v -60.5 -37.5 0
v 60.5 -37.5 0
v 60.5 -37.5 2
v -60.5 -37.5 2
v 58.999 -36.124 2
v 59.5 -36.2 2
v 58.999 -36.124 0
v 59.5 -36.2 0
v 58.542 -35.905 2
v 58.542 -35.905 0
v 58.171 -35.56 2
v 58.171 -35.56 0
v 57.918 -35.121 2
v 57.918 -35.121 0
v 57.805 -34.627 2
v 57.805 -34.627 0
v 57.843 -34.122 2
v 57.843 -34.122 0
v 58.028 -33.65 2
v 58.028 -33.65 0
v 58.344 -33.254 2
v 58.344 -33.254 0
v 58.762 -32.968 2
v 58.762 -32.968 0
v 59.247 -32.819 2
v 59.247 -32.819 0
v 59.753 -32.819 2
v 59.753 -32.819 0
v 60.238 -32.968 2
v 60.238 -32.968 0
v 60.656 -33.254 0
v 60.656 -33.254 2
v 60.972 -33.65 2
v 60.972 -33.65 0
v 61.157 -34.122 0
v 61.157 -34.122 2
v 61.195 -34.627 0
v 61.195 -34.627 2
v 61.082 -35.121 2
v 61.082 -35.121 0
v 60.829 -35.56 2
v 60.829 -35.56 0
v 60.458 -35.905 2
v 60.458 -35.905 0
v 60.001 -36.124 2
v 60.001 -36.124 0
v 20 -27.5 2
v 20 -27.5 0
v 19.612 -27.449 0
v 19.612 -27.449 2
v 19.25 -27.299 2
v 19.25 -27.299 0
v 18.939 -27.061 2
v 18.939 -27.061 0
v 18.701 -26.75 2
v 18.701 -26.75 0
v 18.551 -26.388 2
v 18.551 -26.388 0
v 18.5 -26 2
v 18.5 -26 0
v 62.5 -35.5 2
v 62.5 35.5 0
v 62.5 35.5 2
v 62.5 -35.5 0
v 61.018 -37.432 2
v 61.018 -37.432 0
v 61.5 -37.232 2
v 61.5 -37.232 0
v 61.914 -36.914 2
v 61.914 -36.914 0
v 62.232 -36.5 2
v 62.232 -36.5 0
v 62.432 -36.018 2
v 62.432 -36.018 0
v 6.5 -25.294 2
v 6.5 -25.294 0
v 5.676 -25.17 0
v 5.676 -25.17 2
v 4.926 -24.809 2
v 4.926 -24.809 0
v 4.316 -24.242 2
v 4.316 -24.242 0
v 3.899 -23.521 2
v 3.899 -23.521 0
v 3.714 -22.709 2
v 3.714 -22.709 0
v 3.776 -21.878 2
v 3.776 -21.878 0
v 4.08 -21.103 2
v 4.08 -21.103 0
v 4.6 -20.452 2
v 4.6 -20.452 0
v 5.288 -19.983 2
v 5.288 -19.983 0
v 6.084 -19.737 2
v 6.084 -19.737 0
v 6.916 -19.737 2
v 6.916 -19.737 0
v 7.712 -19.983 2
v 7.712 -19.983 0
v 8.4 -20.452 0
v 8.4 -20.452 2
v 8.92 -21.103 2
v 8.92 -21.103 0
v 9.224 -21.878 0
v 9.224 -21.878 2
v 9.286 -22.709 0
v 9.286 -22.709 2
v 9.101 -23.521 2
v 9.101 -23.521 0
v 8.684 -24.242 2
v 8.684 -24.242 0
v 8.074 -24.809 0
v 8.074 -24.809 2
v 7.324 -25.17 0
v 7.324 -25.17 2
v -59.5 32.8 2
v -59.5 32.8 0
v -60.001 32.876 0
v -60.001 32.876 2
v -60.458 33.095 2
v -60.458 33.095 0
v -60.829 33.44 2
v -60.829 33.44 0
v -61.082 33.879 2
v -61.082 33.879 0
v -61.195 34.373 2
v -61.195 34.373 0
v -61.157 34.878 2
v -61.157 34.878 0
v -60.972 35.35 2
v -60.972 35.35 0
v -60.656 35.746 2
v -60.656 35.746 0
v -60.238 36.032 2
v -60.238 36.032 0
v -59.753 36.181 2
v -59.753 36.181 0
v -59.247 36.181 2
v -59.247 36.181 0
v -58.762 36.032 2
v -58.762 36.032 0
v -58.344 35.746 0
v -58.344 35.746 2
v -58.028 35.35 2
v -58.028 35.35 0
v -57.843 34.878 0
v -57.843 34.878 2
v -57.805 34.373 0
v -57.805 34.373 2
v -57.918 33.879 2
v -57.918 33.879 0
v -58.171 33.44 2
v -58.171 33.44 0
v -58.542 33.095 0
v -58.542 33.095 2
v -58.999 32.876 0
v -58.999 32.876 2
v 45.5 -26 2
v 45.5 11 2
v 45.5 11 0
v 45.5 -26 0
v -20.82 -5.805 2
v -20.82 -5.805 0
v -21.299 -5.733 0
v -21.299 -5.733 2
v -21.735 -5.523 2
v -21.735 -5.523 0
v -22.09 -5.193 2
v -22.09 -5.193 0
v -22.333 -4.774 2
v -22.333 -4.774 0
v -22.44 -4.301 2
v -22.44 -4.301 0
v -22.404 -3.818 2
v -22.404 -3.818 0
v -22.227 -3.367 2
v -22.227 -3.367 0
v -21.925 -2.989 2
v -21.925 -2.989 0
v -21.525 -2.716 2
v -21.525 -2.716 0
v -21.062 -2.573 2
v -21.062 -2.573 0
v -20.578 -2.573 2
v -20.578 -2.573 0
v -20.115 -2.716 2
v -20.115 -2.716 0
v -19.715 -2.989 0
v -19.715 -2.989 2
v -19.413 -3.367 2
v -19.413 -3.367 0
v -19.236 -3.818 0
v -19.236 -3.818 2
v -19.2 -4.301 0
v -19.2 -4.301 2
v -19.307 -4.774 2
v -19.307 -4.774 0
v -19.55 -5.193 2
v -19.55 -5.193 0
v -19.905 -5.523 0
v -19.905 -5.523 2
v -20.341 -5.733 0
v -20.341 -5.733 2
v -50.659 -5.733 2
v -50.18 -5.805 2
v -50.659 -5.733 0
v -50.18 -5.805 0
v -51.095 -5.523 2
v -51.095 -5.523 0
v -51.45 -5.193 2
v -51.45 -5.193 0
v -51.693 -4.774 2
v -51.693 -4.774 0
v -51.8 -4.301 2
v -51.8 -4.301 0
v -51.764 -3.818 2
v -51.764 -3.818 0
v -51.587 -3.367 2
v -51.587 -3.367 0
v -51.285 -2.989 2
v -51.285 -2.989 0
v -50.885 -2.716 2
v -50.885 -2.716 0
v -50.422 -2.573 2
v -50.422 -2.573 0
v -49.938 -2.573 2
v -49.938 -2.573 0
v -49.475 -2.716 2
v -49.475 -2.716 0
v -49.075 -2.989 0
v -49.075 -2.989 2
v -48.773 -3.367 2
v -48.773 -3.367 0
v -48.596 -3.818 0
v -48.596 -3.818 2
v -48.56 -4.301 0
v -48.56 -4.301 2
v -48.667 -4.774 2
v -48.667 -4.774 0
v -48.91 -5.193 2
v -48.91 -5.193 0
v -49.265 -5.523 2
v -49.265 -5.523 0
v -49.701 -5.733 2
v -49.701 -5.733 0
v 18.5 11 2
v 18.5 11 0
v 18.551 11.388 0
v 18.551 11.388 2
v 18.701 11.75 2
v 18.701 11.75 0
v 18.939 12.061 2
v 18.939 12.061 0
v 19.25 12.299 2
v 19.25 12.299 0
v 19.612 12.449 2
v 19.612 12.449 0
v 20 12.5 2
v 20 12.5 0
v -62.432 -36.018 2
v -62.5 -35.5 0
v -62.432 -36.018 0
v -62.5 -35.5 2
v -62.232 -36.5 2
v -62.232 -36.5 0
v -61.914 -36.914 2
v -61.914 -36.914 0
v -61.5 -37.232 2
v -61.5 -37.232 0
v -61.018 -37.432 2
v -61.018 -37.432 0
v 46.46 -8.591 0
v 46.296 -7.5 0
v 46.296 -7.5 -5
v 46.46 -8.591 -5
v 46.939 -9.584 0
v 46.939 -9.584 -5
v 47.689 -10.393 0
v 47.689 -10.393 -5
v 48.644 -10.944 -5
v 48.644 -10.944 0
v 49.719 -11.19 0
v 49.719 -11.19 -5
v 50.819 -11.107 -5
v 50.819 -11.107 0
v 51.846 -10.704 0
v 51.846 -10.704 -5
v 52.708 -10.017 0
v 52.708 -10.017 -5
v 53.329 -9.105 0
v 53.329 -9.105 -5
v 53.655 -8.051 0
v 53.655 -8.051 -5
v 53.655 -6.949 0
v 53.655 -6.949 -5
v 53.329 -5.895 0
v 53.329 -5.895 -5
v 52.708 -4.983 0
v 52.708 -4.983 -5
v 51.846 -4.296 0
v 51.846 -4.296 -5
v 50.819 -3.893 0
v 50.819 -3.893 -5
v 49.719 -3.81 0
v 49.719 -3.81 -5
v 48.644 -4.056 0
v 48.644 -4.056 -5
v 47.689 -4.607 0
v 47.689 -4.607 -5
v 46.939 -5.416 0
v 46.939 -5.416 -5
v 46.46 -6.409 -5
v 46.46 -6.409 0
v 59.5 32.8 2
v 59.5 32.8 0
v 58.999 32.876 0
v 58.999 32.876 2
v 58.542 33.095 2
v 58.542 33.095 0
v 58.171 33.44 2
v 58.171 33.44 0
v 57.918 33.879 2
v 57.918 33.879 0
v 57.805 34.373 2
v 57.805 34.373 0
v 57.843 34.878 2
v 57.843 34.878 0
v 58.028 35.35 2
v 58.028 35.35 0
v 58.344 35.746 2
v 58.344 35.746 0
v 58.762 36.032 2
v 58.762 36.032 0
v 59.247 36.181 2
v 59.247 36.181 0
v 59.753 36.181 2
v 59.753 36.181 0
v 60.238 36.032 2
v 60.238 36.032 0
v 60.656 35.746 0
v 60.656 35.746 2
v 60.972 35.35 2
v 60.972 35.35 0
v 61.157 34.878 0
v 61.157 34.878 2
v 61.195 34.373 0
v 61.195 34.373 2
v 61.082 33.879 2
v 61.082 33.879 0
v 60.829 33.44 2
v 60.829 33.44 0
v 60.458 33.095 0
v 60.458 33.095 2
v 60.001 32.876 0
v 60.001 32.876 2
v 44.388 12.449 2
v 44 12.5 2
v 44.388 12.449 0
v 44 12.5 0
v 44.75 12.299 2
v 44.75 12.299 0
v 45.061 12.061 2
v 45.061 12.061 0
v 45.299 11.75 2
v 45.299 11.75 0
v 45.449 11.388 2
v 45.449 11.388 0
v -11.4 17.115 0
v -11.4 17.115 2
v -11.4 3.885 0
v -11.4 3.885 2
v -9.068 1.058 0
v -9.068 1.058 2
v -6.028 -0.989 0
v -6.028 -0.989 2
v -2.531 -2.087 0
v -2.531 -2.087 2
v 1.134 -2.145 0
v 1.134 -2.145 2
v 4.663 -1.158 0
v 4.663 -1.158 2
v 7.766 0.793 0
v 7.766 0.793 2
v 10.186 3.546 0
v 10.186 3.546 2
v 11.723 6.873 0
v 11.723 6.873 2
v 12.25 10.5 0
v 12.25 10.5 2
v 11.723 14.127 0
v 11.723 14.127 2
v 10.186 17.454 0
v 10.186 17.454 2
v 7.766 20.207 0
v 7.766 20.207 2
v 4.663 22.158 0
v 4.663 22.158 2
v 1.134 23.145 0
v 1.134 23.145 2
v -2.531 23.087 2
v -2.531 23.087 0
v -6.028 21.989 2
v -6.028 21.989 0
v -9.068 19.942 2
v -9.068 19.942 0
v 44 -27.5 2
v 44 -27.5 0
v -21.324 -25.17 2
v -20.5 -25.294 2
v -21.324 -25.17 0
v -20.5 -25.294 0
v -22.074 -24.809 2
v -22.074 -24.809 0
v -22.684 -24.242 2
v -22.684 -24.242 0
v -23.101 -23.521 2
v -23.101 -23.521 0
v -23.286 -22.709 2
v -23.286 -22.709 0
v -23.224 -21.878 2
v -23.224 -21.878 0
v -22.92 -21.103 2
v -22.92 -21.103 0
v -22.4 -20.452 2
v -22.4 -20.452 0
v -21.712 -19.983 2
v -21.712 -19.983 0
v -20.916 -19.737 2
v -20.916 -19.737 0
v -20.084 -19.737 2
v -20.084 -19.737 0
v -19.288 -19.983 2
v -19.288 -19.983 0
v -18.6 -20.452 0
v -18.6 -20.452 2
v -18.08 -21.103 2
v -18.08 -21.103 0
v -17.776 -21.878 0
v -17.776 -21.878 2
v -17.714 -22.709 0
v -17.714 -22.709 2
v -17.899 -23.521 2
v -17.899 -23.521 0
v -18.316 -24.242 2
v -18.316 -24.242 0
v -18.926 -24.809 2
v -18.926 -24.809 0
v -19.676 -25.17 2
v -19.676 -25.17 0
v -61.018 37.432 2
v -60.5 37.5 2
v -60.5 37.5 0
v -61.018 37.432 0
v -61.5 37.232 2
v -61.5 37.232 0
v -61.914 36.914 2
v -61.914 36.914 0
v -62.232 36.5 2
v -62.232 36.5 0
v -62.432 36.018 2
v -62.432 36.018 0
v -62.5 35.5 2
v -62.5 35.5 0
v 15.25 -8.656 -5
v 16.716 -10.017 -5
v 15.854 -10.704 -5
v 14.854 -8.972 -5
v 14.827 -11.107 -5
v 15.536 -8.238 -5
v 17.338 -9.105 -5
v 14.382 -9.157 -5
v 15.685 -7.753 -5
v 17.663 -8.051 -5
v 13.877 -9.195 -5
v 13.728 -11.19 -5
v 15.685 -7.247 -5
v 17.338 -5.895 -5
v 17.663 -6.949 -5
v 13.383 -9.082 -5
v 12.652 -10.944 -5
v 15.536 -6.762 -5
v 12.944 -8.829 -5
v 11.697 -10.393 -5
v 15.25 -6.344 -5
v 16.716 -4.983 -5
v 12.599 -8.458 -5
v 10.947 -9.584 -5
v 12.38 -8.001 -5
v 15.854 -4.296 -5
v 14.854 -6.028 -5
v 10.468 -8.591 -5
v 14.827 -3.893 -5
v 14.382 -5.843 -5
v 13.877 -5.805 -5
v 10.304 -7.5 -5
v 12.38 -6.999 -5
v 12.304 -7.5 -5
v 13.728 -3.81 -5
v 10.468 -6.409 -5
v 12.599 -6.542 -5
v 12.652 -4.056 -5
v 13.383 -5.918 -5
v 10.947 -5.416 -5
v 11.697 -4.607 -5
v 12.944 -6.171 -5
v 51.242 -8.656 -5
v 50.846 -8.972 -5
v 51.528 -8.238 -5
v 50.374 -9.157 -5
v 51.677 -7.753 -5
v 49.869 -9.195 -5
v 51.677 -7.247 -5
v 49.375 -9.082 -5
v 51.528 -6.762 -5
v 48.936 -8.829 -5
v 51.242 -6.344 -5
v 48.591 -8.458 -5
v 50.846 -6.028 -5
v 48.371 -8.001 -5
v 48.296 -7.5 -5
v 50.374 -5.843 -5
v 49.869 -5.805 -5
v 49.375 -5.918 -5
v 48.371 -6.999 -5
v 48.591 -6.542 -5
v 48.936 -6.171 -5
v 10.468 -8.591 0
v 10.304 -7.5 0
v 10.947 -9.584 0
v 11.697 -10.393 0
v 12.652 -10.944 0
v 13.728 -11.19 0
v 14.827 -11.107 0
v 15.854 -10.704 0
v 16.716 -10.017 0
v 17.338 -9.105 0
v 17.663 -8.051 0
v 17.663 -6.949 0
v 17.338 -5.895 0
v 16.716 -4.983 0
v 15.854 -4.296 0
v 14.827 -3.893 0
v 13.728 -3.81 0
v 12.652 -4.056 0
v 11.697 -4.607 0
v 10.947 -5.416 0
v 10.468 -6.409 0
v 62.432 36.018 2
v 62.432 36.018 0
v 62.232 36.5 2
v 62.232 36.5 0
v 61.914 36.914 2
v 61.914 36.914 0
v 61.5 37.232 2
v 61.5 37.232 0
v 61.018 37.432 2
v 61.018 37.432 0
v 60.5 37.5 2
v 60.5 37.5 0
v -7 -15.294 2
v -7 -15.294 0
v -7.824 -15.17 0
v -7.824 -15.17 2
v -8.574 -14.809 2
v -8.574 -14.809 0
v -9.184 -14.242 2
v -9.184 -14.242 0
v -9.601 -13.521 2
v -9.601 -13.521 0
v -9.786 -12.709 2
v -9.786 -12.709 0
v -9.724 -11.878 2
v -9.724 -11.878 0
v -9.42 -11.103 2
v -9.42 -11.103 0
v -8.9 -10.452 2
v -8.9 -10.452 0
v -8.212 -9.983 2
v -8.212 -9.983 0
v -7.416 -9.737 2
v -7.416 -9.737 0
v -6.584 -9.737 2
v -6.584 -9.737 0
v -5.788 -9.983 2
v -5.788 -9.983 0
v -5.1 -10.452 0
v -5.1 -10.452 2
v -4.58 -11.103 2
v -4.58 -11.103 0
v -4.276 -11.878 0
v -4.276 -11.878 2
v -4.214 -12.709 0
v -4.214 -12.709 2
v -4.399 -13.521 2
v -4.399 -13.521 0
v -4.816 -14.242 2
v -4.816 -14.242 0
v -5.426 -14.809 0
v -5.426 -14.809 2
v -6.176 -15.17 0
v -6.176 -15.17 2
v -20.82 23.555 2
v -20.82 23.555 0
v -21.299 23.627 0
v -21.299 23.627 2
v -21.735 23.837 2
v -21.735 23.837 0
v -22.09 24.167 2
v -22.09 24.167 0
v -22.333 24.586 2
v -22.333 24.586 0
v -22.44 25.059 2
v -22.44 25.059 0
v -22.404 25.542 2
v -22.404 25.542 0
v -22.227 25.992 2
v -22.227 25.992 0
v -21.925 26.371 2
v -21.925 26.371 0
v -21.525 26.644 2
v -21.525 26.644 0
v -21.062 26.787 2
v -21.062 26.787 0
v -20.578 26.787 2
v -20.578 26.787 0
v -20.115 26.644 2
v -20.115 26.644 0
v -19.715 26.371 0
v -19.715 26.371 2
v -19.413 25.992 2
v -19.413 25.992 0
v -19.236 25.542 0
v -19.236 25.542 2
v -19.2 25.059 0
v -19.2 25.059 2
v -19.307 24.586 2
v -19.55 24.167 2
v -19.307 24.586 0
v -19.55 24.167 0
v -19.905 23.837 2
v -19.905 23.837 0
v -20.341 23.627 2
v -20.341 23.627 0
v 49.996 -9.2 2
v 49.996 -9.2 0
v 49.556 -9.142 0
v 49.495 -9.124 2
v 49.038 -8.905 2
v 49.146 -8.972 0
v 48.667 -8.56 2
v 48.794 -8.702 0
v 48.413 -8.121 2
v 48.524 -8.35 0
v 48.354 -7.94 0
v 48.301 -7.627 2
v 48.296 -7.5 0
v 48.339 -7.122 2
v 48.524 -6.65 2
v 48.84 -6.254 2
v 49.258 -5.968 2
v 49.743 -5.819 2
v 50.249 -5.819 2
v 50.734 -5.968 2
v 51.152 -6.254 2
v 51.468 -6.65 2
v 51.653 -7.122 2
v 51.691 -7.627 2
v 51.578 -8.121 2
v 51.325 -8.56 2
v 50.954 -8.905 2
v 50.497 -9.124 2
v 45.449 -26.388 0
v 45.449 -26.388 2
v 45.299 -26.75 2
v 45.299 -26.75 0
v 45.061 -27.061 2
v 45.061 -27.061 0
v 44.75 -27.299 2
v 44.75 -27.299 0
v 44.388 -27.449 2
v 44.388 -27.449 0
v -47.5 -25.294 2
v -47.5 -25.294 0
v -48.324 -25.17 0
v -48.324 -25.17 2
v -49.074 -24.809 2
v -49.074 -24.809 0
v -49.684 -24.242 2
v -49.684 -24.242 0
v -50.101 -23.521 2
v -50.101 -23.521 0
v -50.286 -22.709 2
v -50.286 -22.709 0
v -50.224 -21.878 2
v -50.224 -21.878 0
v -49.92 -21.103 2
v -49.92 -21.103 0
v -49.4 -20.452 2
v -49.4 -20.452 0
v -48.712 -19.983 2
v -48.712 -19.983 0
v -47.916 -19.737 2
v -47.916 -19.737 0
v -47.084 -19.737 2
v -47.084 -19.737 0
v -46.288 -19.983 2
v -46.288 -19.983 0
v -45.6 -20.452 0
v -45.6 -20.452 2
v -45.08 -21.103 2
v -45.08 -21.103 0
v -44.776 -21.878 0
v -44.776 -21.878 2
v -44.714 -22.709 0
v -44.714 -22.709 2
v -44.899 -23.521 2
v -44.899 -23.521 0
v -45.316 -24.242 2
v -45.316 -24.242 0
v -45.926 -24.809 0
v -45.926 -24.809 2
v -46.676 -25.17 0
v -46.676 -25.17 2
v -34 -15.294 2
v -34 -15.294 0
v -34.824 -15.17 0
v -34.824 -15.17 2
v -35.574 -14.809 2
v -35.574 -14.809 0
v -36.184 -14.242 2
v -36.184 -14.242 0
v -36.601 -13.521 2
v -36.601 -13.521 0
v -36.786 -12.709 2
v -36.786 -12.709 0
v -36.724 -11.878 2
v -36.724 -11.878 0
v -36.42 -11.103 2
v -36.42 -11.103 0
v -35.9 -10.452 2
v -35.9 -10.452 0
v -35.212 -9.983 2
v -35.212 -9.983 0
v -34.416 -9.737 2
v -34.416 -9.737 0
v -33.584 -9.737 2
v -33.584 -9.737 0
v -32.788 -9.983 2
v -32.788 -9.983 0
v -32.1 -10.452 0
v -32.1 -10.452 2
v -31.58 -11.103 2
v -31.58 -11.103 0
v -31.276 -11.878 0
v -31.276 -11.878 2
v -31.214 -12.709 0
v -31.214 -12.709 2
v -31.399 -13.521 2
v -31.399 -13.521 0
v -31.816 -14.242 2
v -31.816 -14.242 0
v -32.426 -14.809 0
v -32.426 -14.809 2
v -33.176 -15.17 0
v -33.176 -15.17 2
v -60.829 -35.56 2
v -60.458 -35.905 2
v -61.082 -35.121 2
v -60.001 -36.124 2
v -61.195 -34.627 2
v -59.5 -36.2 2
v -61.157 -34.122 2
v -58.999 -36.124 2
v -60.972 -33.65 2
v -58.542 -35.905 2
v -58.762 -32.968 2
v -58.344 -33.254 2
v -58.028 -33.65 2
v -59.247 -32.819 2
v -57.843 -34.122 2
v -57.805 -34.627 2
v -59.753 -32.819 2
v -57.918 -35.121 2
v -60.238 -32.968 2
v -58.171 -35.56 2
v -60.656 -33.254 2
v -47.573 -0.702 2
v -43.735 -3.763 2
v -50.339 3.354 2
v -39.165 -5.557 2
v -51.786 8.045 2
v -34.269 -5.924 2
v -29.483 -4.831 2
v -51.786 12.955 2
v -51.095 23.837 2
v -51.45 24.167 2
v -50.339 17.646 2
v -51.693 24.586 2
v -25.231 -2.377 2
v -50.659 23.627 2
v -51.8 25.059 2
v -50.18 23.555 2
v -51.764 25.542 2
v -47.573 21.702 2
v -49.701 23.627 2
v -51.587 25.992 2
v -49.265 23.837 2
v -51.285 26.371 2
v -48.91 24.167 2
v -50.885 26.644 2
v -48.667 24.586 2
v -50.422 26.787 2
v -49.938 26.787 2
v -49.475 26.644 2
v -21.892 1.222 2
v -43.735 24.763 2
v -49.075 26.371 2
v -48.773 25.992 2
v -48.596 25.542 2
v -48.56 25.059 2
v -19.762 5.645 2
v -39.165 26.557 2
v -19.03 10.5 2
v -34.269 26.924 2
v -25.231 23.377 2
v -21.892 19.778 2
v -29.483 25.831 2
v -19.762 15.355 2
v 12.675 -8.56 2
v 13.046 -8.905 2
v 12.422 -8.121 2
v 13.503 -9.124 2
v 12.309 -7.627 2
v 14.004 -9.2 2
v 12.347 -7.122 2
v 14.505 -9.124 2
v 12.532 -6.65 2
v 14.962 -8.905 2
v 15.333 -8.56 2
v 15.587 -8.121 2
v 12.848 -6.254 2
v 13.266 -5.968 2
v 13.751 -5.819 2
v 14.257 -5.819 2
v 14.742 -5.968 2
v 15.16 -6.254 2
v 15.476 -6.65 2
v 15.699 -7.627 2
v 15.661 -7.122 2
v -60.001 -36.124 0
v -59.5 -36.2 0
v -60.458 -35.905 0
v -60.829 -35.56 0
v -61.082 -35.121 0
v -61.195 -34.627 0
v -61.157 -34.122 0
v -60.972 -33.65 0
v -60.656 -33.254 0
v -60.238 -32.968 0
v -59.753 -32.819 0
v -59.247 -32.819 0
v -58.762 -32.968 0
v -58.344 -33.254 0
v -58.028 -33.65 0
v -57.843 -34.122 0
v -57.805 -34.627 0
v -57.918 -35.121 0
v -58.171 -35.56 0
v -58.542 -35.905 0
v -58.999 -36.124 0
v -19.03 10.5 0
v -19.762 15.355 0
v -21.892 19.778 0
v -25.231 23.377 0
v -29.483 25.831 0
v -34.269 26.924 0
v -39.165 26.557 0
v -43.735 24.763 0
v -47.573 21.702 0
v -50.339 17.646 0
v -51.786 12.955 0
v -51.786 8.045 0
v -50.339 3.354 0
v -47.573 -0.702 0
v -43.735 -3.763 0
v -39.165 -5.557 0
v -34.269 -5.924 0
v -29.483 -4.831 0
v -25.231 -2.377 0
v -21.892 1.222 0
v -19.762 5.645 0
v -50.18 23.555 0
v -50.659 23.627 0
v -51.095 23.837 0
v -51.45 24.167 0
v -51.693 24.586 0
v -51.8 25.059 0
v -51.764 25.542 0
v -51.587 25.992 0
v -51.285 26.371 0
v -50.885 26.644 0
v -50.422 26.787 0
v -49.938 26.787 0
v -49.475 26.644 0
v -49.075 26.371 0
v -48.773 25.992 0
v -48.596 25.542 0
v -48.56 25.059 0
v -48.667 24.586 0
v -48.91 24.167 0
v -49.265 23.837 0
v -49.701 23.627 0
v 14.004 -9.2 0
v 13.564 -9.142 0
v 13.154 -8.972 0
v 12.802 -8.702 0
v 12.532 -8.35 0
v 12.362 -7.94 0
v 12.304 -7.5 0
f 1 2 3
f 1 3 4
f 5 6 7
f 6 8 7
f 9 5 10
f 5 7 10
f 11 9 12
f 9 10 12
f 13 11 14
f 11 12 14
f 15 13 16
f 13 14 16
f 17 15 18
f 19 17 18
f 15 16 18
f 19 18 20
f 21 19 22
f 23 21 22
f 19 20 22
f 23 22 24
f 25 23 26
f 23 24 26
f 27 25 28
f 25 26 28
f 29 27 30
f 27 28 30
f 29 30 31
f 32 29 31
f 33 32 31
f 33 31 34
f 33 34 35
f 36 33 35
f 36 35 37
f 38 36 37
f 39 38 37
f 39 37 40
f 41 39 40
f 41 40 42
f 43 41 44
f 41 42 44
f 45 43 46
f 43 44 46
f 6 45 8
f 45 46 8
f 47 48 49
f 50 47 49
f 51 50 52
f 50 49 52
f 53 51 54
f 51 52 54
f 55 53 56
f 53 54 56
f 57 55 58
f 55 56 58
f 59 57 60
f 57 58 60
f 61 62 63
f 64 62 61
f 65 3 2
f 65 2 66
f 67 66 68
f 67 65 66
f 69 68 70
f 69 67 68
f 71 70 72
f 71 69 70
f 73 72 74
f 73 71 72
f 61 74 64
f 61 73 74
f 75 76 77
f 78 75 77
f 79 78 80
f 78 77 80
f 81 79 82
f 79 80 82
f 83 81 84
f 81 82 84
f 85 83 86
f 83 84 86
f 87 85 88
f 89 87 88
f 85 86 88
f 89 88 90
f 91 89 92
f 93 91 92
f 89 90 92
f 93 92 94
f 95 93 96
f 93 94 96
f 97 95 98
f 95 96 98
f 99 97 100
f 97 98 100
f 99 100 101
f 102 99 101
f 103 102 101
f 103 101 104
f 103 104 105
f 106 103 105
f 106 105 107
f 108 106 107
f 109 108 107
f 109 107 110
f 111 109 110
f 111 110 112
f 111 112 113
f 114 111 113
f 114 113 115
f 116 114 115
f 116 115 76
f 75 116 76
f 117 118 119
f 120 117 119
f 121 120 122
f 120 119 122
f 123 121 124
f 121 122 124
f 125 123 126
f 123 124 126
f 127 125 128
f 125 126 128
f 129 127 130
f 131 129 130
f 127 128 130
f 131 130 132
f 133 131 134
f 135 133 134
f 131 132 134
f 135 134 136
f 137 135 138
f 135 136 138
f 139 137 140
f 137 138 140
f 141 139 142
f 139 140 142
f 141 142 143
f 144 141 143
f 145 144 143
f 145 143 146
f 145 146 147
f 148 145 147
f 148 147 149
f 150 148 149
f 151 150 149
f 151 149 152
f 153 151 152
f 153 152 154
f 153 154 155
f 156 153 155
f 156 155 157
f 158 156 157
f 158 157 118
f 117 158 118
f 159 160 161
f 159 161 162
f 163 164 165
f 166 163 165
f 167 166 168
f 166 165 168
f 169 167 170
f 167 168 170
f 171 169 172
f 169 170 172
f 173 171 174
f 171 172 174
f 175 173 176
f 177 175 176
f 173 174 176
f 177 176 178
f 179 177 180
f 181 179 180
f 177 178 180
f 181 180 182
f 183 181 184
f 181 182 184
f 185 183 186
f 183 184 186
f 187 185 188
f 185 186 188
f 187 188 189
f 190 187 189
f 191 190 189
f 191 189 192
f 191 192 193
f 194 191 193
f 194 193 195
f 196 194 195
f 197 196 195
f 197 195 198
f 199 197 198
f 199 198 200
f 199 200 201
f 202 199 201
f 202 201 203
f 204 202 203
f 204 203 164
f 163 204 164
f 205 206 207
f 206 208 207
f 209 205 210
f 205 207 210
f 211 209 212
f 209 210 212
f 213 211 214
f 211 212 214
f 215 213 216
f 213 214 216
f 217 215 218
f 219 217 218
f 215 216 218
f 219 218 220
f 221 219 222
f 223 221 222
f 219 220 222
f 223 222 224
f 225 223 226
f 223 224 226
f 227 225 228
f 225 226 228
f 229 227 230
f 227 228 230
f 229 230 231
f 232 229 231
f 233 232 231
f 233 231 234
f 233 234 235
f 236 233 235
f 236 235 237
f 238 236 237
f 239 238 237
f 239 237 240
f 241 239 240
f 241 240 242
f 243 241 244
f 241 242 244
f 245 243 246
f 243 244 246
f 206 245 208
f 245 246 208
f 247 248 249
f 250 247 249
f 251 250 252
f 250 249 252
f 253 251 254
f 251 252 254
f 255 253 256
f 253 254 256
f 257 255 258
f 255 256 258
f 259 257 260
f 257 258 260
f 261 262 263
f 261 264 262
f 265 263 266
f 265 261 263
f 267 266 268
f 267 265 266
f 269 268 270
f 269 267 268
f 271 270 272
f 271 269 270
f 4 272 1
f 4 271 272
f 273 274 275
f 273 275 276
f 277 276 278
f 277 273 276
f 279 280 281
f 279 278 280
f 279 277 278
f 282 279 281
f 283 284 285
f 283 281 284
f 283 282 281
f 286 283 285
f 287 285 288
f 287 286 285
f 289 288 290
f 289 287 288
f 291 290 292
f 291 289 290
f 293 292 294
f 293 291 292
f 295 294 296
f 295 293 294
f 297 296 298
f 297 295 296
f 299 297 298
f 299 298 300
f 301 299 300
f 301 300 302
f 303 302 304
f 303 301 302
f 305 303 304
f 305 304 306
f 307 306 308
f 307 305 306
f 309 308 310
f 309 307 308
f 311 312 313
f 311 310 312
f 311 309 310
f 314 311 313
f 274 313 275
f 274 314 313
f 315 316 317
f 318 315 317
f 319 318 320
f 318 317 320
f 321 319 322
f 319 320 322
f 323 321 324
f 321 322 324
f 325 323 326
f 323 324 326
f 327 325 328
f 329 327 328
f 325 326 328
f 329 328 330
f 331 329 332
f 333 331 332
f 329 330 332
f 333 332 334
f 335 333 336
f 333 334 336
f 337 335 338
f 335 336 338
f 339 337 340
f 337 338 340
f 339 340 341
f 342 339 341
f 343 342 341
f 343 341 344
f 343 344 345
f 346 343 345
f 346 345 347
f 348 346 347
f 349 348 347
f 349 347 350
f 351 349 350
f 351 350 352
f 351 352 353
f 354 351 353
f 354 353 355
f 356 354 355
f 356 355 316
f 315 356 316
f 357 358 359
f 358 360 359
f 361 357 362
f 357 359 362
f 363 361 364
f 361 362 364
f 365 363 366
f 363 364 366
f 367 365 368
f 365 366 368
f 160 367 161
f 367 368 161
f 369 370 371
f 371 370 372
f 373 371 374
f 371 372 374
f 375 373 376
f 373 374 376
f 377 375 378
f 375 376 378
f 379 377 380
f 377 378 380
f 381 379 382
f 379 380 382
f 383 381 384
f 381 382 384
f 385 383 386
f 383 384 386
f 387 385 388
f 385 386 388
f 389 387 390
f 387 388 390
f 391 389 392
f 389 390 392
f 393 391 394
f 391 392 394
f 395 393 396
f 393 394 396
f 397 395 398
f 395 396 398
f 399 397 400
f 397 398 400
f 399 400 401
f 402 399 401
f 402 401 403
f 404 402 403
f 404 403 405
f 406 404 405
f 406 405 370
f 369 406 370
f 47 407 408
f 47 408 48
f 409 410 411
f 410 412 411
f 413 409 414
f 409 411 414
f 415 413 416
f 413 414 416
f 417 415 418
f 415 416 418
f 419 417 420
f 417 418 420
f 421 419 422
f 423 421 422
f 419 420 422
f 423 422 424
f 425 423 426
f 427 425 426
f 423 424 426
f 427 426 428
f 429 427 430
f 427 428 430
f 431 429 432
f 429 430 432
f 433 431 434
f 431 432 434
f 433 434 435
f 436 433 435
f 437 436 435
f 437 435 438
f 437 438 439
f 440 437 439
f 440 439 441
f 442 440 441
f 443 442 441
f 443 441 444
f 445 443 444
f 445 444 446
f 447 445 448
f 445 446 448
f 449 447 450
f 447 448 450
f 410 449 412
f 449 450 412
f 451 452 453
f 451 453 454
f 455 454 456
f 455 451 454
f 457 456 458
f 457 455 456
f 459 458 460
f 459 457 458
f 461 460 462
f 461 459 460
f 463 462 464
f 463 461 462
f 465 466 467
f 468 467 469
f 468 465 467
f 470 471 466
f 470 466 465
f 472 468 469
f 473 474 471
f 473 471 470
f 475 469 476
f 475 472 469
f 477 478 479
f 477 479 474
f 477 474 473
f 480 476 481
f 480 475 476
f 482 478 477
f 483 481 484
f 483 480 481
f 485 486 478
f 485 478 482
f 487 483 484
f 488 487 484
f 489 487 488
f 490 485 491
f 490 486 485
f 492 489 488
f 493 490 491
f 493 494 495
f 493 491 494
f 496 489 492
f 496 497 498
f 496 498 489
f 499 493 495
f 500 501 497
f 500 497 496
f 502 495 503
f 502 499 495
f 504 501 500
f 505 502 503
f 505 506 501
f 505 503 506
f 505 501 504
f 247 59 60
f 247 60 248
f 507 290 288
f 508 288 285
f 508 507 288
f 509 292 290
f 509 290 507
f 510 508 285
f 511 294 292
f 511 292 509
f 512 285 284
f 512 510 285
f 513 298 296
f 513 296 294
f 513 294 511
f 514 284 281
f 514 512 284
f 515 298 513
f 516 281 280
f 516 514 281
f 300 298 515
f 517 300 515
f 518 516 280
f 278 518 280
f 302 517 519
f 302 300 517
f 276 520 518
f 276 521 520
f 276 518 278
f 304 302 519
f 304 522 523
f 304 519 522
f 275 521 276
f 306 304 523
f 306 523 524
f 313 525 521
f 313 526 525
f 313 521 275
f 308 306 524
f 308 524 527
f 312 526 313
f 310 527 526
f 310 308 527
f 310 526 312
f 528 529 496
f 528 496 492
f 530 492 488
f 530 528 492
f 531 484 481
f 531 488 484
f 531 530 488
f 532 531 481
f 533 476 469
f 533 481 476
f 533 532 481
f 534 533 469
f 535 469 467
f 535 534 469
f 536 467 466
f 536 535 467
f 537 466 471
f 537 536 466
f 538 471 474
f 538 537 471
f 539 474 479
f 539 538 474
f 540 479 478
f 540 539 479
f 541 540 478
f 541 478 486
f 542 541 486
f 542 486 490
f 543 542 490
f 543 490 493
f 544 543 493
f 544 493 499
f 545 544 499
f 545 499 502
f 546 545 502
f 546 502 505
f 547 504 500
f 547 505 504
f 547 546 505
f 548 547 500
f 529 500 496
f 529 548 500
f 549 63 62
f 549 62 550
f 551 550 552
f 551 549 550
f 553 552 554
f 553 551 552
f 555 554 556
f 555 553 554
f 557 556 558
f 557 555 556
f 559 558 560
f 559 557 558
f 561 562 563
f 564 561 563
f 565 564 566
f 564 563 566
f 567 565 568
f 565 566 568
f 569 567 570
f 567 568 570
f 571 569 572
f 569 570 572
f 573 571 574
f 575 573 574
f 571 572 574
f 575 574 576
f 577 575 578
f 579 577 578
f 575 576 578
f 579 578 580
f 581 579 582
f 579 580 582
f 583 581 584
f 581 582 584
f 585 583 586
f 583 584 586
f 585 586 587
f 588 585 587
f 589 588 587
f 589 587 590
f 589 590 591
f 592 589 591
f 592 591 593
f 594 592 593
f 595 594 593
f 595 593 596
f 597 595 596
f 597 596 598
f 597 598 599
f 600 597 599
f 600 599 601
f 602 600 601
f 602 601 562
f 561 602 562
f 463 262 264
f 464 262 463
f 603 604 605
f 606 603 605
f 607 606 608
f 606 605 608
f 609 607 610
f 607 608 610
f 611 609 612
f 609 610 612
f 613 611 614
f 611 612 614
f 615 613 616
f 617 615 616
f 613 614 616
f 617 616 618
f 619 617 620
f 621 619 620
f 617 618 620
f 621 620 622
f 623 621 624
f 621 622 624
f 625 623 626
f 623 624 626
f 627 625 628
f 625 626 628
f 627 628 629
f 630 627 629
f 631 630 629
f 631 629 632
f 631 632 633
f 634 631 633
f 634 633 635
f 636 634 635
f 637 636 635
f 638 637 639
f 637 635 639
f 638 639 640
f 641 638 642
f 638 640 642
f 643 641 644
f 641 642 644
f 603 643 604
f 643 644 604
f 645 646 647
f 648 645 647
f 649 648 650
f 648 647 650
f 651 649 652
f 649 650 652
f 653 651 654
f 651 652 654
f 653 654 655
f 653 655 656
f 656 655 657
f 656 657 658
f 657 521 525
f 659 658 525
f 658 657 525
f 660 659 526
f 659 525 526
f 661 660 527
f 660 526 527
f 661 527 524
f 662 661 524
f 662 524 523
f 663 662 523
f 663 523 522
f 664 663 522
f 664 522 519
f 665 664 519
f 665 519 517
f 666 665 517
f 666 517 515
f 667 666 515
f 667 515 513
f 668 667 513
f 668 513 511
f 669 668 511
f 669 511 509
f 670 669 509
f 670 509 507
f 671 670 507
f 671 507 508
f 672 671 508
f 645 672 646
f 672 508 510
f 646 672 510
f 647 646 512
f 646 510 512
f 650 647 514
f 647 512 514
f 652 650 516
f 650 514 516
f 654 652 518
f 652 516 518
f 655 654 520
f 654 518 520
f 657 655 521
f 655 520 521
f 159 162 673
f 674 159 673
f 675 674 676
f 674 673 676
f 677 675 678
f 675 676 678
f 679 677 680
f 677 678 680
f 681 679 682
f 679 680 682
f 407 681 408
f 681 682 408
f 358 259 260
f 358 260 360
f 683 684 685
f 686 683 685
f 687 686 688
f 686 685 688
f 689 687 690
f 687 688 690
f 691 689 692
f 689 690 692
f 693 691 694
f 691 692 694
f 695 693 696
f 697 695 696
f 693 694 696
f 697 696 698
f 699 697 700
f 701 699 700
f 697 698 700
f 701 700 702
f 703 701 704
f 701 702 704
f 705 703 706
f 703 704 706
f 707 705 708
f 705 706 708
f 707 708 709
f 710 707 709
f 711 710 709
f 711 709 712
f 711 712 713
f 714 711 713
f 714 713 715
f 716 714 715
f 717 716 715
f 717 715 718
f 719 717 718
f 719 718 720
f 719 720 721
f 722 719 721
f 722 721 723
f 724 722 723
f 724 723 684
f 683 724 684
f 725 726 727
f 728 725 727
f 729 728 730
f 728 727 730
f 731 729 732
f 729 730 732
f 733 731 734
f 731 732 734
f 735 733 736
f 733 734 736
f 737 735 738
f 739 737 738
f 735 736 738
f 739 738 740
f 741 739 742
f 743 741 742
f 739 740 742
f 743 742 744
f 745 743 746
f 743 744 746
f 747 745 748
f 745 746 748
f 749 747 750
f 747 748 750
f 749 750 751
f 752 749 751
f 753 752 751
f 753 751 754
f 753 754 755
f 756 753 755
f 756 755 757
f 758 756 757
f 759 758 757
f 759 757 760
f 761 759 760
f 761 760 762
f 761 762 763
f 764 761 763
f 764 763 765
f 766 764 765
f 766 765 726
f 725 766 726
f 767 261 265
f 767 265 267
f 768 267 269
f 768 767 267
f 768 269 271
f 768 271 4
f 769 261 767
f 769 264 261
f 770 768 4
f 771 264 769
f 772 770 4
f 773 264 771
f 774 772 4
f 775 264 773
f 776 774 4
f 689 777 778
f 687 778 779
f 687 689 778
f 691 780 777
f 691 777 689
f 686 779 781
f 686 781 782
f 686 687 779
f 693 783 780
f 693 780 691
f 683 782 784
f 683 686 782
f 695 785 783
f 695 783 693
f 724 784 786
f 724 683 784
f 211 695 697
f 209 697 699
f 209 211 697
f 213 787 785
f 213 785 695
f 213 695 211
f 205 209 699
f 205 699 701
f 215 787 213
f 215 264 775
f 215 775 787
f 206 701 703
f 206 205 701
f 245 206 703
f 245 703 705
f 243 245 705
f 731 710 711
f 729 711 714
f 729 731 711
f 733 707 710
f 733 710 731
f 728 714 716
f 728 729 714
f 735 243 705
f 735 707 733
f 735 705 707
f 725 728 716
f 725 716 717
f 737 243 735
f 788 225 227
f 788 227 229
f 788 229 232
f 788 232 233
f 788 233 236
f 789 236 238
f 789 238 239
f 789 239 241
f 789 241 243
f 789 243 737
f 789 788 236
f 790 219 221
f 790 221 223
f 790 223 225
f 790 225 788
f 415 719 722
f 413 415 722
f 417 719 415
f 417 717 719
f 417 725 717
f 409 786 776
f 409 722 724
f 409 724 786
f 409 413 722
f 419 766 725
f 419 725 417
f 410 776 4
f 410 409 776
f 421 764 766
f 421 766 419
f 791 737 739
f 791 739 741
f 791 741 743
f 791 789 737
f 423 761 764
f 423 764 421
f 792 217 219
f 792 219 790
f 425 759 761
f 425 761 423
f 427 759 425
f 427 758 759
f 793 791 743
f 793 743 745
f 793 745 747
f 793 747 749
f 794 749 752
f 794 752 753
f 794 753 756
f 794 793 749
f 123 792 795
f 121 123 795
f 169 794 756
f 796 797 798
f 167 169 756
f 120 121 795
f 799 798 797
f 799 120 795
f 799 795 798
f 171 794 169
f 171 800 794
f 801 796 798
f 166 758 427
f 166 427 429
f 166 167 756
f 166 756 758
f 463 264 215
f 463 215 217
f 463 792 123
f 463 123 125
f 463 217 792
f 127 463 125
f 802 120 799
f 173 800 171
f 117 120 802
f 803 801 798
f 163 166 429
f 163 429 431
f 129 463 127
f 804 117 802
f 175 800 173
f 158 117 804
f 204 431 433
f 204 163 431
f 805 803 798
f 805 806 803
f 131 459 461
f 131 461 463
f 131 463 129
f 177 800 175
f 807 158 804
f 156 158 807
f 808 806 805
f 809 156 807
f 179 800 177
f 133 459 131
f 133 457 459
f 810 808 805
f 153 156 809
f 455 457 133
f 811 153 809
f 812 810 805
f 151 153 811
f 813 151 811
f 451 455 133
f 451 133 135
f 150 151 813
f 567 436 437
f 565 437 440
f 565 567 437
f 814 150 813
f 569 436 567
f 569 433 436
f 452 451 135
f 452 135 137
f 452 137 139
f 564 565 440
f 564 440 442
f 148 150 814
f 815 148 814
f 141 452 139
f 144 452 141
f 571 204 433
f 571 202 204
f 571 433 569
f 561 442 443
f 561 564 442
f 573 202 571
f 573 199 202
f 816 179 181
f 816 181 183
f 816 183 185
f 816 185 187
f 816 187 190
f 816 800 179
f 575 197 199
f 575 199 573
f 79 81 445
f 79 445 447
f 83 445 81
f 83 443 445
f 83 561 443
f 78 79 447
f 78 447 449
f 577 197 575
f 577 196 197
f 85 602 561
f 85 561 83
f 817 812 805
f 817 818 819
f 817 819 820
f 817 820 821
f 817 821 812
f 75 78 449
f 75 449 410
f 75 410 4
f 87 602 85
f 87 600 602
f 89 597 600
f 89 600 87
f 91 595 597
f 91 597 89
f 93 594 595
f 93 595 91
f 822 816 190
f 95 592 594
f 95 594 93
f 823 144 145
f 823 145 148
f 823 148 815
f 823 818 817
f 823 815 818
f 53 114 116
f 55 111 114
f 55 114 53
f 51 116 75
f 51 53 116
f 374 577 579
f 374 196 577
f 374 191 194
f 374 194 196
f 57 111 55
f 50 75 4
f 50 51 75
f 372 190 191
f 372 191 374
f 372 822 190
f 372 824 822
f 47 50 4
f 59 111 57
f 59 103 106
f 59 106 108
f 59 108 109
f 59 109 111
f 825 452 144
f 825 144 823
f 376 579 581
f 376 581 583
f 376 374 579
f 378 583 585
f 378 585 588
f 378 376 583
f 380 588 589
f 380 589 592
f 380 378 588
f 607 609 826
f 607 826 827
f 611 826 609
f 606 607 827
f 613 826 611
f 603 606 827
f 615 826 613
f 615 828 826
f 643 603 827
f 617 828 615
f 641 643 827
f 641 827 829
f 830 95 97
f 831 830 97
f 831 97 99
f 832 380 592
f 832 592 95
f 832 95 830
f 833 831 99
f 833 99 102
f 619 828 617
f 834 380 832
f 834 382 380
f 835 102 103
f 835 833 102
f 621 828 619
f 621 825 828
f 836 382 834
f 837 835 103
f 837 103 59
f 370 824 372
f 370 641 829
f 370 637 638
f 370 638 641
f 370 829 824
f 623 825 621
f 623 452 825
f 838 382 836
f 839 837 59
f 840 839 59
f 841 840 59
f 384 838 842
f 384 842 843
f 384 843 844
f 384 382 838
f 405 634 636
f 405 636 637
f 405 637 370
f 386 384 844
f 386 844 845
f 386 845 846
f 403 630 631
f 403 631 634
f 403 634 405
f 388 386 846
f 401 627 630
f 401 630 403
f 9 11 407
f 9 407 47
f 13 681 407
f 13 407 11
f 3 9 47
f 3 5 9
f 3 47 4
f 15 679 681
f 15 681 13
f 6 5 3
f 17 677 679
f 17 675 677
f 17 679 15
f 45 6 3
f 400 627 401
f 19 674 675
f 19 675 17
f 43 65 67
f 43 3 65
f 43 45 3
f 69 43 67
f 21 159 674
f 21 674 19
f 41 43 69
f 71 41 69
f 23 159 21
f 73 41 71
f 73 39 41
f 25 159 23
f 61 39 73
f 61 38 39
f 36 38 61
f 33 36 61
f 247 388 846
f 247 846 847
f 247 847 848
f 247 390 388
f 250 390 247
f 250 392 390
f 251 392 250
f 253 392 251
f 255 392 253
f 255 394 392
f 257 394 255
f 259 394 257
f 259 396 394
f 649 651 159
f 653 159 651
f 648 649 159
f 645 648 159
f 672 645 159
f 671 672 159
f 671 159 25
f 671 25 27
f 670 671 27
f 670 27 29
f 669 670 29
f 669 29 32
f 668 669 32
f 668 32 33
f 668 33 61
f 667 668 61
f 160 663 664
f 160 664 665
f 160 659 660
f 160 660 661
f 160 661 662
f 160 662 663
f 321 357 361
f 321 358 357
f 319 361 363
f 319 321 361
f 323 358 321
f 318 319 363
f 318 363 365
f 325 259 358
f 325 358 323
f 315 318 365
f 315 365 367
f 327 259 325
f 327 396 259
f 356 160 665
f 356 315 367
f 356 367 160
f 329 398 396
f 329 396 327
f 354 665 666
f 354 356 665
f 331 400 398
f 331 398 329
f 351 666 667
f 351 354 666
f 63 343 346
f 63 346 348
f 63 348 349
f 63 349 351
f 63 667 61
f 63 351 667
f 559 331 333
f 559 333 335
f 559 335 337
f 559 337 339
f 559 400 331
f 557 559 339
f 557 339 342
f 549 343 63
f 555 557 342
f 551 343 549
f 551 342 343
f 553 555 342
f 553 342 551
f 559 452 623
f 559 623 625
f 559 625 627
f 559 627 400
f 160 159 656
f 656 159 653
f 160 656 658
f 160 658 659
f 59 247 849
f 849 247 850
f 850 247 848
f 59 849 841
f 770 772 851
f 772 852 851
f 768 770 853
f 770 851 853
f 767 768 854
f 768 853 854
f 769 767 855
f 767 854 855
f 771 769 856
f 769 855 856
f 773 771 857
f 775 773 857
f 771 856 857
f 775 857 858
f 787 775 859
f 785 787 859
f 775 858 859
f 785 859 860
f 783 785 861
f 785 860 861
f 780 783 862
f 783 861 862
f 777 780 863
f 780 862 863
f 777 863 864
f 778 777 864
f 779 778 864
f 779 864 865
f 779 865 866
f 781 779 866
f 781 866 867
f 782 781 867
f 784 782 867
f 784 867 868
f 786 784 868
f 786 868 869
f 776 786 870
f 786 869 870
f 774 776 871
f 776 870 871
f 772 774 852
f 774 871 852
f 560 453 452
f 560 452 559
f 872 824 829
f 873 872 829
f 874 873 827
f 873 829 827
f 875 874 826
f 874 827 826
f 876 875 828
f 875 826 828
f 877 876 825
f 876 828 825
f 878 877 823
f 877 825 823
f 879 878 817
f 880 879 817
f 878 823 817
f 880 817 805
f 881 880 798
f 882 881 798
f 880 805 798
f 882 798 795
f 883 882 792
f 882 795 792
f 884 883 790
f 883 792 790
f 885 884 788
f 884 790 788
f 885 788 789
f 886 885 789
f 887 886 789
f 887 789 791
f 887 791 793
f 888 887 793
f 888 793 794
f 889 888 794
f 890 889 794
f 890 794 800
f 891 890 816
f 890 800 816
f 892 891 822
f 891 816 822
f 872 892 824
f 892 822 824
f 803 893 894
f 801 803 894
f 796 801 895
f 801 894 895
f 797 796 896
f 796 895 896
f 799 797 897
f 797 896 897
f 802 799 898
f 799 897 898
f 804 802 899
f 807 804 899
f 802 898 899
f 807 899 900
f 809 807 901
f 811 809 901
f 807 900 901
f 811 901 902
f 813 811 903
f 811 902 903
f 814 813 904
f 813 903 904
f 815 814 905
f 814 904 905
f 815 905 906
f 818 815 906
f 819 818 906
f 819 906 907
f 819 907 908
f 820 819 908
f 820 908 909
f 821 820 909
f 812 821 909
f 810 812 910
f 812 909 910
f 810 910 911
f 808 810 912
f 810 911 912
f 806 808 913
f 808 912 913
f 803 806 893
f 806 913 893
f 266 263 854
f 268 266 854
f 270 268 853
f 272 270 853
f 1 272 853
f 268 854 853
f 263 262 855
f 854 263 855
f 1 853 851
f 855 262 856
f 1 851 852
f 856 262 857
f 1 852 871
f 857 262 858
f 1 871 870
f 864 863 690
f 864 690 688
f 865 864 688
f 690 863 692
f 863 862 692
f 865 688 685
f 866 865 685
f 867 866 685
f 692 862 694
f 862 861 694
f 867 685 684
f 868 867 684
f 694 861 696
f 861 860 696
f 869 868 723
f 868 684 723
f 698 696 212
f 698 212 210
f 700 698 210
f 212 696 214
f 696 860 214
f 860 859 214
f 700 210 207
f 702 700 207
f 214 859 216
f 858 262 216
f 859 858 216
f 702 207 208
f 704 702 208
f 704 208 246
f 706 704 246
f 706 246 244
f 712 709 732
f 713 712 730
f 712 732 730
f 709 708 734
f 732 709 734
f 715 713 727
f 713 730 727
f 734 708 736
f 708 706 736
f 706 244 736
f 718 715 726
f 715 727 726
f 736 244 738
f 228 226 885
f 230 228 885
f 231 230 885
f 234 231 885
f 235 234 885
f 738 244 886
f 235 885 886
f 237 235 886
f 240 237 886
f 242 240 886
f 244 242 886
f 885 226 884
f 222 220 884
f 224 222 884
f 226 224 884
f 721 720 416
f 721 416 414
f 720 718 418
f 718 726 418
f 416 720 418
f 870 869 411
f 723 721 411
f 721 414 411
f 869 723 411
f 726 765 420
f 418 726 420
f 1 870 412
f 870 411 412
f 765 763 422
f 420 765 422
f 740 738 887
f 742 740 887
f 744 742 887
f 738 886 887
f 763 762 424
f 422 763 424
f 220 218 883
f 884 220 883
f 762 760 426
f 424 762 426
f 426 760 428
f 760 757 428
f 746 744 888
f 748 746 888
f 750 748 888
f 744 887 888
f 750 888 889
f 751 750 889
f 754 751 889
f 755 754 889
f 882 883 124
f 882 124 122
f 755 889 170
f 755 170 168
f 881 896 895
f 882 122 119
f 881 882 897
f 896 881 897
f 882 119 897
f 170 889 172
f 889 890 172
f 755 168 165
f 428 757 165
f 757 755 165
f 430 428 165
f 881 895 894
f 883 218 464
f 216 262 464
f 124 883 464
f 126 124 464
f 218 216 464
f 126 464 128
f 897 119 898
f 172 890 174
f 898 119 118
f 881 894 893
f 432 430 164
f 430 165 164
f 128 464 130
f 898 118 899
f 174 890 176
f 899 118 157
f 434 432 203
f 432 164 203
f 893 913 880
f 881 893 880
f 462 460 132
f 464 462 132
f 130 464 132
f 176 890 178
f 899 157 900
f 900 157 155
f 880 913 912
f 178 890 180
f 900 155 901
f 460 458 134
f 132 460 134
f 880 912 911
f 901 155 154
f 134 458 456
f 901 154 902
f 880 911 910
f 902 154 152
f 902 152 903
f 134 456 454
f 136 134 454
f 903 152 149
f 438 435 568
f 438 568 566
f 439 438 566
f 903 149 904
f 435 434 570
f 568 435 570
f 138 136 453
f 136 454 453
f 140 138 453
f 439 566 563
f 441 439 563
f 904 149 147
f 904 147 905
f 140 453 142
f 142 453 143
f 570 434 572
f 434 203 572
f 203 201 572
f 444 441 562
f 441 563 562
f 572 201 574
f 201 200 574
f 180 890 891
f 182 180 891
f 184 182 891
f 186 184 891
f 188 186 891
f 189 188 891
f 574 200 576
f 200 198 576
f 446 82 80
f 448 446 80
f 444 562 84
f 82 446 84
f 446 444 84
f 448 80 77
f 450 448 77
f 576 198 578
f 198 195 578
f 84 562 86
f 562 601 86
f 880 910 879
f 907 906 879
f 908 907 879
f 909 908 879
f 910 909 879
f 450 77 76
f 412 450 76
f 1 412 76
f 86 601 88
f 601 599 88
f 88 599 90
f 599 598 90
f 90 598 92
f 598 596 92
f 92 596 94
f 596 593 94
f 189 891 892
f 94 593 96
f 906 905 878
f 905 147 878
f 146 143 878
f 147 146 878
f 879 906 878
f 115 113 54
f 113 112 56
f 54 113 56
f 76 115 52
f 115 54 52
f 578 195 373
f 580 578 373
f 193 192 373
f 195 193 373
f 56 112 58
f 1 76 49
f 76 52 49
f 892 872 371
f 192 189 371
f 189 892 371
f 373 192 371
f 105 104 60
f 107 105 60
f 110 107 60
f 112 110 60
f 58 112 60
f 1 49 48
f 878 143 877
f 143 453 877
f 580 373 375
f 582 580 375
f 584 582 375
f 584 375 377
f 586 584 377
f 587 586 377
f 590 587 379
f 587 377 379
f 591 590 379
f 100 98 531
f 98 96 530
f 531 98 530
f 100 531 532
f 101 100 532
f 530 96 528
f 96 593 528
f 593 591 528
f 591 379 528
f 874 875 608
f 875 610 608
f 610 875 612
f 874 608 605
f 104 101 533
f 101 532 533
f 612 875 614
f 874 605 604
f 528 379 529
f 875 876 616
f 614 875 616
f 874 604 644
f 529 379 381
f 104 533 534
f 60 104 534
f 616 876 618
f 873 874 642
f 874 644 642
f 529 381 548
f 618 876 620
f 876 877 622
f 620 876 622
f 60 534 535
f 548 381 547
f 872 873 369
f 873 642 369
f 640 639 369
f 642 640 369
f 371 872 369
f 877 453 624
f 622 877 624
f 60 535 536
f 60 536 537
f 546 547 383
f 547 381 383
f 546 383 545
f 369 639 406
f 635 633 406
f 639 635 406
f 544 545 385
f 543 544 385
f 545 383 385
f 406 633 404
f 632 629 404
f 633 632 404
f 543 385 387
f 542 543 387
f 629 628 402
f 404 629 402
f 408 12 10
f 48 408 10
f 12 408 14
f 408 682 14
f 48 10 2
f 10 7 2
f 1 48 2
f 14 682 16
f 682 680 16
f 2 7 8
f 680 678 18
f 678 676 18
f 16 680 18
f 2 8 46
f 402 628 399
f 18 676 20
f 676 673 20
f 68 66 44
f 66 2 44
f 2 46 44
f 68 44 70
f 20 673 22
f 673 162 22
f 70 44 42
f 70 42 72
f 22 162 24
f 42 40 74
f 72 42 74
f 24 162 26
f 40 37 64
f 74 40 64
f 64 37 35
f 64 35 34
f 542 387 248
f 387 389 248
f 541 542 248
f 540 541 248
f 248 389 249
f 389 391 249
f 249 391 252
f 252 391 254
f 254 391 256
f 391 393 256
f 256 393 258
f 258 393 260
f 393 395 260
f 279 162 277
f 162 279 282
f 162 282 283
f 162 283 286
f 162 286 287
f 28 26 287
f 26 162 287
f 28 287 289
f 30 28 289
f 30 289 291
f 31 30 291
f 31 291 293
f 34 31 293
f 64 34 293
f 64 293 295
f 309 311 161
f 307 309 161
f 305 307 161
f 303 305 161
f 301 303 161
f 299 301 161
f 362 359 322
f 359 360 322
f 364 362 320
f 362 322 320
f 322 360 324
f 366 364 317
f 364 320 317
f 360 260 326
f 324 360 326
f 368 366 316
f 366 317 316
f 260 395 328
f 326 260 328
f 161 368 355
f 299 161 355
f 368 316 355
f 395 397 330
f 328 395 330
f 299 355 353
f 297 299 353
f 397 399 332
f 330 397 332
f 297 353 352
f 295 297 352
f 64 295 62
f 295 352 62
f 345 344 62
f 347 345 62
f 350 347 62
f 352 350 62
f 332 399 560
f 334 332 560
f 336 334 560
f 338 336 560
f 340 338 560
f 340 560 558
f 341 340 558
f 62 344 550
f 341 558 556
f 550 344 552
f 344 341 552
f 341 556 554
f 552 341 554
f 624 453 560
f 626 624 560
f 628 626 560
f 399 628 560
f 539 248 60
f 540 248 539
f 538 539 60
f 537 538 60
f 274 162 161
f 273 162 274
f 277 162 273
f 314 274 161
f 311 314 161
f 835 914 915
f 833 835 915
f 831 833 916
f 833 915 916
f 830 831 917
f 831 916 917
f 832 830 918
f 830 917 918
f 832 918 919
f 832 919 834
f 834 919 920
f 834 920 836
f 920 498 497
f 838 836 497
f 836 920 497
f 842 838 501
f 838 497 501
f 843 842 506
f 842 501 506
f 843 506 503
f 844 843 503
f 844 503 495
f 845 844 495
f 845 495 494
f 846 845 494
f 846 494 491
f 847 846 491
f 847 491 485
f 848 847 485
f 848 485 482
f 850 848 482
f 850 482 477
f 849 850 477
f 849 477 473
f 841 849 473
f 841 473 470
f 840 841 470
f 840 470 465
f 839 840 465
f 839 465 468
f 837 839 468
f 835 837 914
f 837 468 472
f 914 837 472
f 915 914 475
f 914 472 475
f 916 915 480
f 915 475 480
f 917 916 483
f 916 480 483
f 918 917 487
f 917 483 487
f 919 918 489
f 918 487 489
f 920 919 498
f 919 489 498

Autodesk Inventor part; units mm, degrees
ref_plane "YZ Plane" through (0, 0, 0) normal (1, 0, 0) x (0, 1, 0)
ref_plane "XZ Plane" through (0, 0, 0) normal (0, 1, 0) x (-1, 0, 0)
ref_plane "XY Plane" through (0, 0, 0) normal (0, 0, 1) x (1, 0, 0)
sketch "Sketch1" plane through (0, 0, 0) normal (0, 0, 1) x (1, 0, 0)
  line L0 (-62.5, 37.5) -> (62.5, 37.5)
  line L1 (62.5, 37.5) -> (62.5, -37.5)
  line L2 (62.5, -37.5) -> (-62.5, -37.5)
  line L3 (-62.5, -37.5) -> (-62.5, 37.5)
  point P0 (0, 0)
  point P1 (-62.5, 0)
  point P2 (0, 37.5)
  dimension "d0" = 125
  dimension "d1" = 75
extrude "Extrusion1" add sketch "Sketch1" along normal blind 2
sketch "Sketch2" plane through (0, 0, 2) normal (0, 0, 1) x (1, 0, 0)
  line L0 (-62.5, -37.5) -> (62.5, -37.5) projected
  line L1 (62.5, -37.5) -> (62.5, 37.5) projected
  line L2 (62.5, 37.5) -> (-62.5, 37.5) projected
  line L3 (-62.5, 37.5) -> (-62.5, -37.5) projected
  line L4 (-59.5, 34.5) -> (59.5, 34.5)
  line L5 (59.5, 34.5) -> (59.5, -34.5)
  line L6 (59.5, -34.5) -> (-59.5, -34.5)
  line L7 (-59.5, -34.5) -> (-59.5, 34.5)
  point P0 (0, 0)
  dimension "d4" = 3
hole "Hole1" at (-59.5, 34.5, 2) at (59.5, 34.5, 2) at (-59.5, -34.5, 2) at (59.5, -34.5, 2) direction (0, 0, -1) diameter 3.4 end through all clearance for "Oval Head Machine Screw" size "M3" standard "Ansi Metric M Profile"
fillet "Fillet1" radius 2 4 edges at (-62.5, 37.5, 1) (-62.5, -37.5, 1) (62.5, -37.5, 1) (62.5, 37.5, 1)
sketch "Sketch3" plane through (0, 0, 2) normal (0, 0, 1) x (1, 0, 0)
  line L0 (18.5, 12.5) -> (45.5, 12.5)
  line L1 (45.5, 12.5) -> (45.5, -27.5)
  line L2 (45.5, -27.5) -> (18.5, -27.5)
  line L3 (18.5, -27.5) -> (18.5, 12.5)
  line L4 (62.5, -35.5) -> (62.5, 35.5) projected
  line L5 (60.5, 37.5) -> (-60.5, 37.5) projected
  point P0 (0, 0)
  dimension "d13" = 27
  dimension "d14" = 40
  dimension "d16" = 17
  dimension "d73" = 25
extrude "Extrusion2" cut sketch "Sketch3" against normal through all
fillet "Fillet2" radius 1.5 4 edges at (18.5, -27.5, 1) (18.5, 12.5, 1) (45.5, 12.5, 1) (45.5, -27.5, 1)
sketch "Sketch4" plane through (0, 0, 2) normal (0, 0, 1) x (1, 0, 0)
  line L0 (44, 12.5) -> (20, 12.5) projected
  line L1 (44, -27.5) -> (20, -27.5) projected
  line L2 (18.5, -26) -> (18.5, 11) projected
  line L3 (20, 12.5) -> (44, 12.5) projected
  line L4 (45.5, 11) -> (45.5, -26) projected
  line L5 (14.0041, -17.1435) -> (14.0041, 2.1435)
  line L6 (49.9959, 2.1435) -> (49.9959, -17.1435)
  line L7 (32, 12.5) -> (32, -27.5)
  point P0 (0, 0)
  point P1 (14.0041, -7.5)
  point P2 (49.9959, -7.5)
  point P3 (18.5, -7.5)
  point P4 (45.5, -7.5)
  dimension "d21" = 35.9918
hole "Hole2" at (14.0041, -7.5, 2) at (49.9959, -7.5, 2) direction (0, 0, -1) diameter 3.4 depth 6 tip angle 118 clearance for "Oval Head Machine Screw" size "M3" standard "Ansi Metric M Profile"
sketch "Sketch6" plane through (0, 0, 2) normal (0, 0, 1) x (1, 0, 0)
  circle A0 centre (-0.5, 10.5) radius 12.75
  line L0 (-11.4, 17.1146) -> (-11.4, 3.8854)
  line L1 (-62.5, 35.5) -> (-62.5, -35.5) projected
  line L2 (60.5, 37.5) -> (-60.5, 37.5) projected
  point P0 (0, 0)
  dimension "d35" = 25.5
  dimension "d36" = 10.9
  dimension "d74" = 62
  dimension "d75" = 27
extrude "Extrusion4" cut sketch "Sketch6" against normal blind 10 contours A0 L0 picked at (-2.2841, 10.5)
sketch "Sketch7" plane through (0, 0, 2) normal (0, 0, 1) x (1, 0, 0)
  line L0 (-47.5, -22.5) -> (6.5, -22.5)
  line L1 (-62.5, 35.5) -> (-62.5, -35.5) projected
  line L2 (-60.5, -37.5) -> (60.5, -37.5) projected
  line L3 (-34, -12.5) -> (-7, -12.5)
  point P0 (0, 0)
  point P1 (-20.5, -22.5)
  point P2 (-20.5, -12.5)
  dimension "d40" = 54
  dimension "d43" = 15
  dimension "d56" = 15
  dimension "d57" = 10
  dimension "d58" = 27
hole "Hole3" at (-47.5, -22.5, 2) at (6.5, -22.5, 2) at (-20.5, -22.5, 2) at (-34, -12.5, 2) at (-7, -12.5, 2) direction (0, 0, -1) diameter 5.588 end through all thread size "1/4-36 UNS" class "2B" standard "ANSI Unified Screw Threads"
sketch "Sketch8" plane through (0, 0, 0) normal (0, 0, -1) x (-1, 0, 0)
  circle A0 centre (-49.9959, -7.5) radius 1.7 projected
  circle A1 centre (-14.0041, -7.5) radius 1.7 projected
  circle A2 centre (-49.9959, -7.5) radius 3.7
  circle A3 centre (-14.0041, -7.5) radius 3.7
  point P0 (0, 0)
  dimension "d52" = 2
  dimension "d53" = 2
extrude "Extrusion5" add sketch "Sketch8" along normal blind 5
sketch "Sketch9" plane through (0, 0, 2) normal (0, 0, 1) x (1, 0, 0)
  circle A0 centre (-35.5, 10.5) radius 16.47
  line L0 (60.5, 37.5) -> (-60.5, 37.5) projected
  line L1 (-62.5, 35.5) -> (-62.5, -35.5) projected
  line L2 (-50.18, 25.18) -> (-20.82, 25.18)
  line L3 (-20.82, 25.18) -> (-20.82, -4.18)
  line L4 (-20.82, -4.18) -> (-50.18, -4.18)
  line L5 (-50.18, -4.18) -> (-50.18, 25.18)
  point P0 (0, 0)
  point P1 (-20.82, 10.5)
  point P2 (-35.5, 25.18)
  dimension "d59" = 32.94
  dimension "d60" = 27
  dimension "d61" = 27
  dimension "d62" = 29.36
  dimension "d63" = 29.36
extrude "Extrusion6" cut sketch "Sketch9" against normal blind 10 contours A0 L3 | L3 A0 L4 L5 L2 | L2 A0 | A0 L4 | L5 A0
hole "Hole4" at (-50.18, 25.18, 2) at (-20.82, 25.18, 2) at (-50.18, -4.18, 2) at (-20.82, -4.18, 2) direction (0, 0, -1) diameter 3.25 end through all
properties part number "LI0011-IO SHIELD"
